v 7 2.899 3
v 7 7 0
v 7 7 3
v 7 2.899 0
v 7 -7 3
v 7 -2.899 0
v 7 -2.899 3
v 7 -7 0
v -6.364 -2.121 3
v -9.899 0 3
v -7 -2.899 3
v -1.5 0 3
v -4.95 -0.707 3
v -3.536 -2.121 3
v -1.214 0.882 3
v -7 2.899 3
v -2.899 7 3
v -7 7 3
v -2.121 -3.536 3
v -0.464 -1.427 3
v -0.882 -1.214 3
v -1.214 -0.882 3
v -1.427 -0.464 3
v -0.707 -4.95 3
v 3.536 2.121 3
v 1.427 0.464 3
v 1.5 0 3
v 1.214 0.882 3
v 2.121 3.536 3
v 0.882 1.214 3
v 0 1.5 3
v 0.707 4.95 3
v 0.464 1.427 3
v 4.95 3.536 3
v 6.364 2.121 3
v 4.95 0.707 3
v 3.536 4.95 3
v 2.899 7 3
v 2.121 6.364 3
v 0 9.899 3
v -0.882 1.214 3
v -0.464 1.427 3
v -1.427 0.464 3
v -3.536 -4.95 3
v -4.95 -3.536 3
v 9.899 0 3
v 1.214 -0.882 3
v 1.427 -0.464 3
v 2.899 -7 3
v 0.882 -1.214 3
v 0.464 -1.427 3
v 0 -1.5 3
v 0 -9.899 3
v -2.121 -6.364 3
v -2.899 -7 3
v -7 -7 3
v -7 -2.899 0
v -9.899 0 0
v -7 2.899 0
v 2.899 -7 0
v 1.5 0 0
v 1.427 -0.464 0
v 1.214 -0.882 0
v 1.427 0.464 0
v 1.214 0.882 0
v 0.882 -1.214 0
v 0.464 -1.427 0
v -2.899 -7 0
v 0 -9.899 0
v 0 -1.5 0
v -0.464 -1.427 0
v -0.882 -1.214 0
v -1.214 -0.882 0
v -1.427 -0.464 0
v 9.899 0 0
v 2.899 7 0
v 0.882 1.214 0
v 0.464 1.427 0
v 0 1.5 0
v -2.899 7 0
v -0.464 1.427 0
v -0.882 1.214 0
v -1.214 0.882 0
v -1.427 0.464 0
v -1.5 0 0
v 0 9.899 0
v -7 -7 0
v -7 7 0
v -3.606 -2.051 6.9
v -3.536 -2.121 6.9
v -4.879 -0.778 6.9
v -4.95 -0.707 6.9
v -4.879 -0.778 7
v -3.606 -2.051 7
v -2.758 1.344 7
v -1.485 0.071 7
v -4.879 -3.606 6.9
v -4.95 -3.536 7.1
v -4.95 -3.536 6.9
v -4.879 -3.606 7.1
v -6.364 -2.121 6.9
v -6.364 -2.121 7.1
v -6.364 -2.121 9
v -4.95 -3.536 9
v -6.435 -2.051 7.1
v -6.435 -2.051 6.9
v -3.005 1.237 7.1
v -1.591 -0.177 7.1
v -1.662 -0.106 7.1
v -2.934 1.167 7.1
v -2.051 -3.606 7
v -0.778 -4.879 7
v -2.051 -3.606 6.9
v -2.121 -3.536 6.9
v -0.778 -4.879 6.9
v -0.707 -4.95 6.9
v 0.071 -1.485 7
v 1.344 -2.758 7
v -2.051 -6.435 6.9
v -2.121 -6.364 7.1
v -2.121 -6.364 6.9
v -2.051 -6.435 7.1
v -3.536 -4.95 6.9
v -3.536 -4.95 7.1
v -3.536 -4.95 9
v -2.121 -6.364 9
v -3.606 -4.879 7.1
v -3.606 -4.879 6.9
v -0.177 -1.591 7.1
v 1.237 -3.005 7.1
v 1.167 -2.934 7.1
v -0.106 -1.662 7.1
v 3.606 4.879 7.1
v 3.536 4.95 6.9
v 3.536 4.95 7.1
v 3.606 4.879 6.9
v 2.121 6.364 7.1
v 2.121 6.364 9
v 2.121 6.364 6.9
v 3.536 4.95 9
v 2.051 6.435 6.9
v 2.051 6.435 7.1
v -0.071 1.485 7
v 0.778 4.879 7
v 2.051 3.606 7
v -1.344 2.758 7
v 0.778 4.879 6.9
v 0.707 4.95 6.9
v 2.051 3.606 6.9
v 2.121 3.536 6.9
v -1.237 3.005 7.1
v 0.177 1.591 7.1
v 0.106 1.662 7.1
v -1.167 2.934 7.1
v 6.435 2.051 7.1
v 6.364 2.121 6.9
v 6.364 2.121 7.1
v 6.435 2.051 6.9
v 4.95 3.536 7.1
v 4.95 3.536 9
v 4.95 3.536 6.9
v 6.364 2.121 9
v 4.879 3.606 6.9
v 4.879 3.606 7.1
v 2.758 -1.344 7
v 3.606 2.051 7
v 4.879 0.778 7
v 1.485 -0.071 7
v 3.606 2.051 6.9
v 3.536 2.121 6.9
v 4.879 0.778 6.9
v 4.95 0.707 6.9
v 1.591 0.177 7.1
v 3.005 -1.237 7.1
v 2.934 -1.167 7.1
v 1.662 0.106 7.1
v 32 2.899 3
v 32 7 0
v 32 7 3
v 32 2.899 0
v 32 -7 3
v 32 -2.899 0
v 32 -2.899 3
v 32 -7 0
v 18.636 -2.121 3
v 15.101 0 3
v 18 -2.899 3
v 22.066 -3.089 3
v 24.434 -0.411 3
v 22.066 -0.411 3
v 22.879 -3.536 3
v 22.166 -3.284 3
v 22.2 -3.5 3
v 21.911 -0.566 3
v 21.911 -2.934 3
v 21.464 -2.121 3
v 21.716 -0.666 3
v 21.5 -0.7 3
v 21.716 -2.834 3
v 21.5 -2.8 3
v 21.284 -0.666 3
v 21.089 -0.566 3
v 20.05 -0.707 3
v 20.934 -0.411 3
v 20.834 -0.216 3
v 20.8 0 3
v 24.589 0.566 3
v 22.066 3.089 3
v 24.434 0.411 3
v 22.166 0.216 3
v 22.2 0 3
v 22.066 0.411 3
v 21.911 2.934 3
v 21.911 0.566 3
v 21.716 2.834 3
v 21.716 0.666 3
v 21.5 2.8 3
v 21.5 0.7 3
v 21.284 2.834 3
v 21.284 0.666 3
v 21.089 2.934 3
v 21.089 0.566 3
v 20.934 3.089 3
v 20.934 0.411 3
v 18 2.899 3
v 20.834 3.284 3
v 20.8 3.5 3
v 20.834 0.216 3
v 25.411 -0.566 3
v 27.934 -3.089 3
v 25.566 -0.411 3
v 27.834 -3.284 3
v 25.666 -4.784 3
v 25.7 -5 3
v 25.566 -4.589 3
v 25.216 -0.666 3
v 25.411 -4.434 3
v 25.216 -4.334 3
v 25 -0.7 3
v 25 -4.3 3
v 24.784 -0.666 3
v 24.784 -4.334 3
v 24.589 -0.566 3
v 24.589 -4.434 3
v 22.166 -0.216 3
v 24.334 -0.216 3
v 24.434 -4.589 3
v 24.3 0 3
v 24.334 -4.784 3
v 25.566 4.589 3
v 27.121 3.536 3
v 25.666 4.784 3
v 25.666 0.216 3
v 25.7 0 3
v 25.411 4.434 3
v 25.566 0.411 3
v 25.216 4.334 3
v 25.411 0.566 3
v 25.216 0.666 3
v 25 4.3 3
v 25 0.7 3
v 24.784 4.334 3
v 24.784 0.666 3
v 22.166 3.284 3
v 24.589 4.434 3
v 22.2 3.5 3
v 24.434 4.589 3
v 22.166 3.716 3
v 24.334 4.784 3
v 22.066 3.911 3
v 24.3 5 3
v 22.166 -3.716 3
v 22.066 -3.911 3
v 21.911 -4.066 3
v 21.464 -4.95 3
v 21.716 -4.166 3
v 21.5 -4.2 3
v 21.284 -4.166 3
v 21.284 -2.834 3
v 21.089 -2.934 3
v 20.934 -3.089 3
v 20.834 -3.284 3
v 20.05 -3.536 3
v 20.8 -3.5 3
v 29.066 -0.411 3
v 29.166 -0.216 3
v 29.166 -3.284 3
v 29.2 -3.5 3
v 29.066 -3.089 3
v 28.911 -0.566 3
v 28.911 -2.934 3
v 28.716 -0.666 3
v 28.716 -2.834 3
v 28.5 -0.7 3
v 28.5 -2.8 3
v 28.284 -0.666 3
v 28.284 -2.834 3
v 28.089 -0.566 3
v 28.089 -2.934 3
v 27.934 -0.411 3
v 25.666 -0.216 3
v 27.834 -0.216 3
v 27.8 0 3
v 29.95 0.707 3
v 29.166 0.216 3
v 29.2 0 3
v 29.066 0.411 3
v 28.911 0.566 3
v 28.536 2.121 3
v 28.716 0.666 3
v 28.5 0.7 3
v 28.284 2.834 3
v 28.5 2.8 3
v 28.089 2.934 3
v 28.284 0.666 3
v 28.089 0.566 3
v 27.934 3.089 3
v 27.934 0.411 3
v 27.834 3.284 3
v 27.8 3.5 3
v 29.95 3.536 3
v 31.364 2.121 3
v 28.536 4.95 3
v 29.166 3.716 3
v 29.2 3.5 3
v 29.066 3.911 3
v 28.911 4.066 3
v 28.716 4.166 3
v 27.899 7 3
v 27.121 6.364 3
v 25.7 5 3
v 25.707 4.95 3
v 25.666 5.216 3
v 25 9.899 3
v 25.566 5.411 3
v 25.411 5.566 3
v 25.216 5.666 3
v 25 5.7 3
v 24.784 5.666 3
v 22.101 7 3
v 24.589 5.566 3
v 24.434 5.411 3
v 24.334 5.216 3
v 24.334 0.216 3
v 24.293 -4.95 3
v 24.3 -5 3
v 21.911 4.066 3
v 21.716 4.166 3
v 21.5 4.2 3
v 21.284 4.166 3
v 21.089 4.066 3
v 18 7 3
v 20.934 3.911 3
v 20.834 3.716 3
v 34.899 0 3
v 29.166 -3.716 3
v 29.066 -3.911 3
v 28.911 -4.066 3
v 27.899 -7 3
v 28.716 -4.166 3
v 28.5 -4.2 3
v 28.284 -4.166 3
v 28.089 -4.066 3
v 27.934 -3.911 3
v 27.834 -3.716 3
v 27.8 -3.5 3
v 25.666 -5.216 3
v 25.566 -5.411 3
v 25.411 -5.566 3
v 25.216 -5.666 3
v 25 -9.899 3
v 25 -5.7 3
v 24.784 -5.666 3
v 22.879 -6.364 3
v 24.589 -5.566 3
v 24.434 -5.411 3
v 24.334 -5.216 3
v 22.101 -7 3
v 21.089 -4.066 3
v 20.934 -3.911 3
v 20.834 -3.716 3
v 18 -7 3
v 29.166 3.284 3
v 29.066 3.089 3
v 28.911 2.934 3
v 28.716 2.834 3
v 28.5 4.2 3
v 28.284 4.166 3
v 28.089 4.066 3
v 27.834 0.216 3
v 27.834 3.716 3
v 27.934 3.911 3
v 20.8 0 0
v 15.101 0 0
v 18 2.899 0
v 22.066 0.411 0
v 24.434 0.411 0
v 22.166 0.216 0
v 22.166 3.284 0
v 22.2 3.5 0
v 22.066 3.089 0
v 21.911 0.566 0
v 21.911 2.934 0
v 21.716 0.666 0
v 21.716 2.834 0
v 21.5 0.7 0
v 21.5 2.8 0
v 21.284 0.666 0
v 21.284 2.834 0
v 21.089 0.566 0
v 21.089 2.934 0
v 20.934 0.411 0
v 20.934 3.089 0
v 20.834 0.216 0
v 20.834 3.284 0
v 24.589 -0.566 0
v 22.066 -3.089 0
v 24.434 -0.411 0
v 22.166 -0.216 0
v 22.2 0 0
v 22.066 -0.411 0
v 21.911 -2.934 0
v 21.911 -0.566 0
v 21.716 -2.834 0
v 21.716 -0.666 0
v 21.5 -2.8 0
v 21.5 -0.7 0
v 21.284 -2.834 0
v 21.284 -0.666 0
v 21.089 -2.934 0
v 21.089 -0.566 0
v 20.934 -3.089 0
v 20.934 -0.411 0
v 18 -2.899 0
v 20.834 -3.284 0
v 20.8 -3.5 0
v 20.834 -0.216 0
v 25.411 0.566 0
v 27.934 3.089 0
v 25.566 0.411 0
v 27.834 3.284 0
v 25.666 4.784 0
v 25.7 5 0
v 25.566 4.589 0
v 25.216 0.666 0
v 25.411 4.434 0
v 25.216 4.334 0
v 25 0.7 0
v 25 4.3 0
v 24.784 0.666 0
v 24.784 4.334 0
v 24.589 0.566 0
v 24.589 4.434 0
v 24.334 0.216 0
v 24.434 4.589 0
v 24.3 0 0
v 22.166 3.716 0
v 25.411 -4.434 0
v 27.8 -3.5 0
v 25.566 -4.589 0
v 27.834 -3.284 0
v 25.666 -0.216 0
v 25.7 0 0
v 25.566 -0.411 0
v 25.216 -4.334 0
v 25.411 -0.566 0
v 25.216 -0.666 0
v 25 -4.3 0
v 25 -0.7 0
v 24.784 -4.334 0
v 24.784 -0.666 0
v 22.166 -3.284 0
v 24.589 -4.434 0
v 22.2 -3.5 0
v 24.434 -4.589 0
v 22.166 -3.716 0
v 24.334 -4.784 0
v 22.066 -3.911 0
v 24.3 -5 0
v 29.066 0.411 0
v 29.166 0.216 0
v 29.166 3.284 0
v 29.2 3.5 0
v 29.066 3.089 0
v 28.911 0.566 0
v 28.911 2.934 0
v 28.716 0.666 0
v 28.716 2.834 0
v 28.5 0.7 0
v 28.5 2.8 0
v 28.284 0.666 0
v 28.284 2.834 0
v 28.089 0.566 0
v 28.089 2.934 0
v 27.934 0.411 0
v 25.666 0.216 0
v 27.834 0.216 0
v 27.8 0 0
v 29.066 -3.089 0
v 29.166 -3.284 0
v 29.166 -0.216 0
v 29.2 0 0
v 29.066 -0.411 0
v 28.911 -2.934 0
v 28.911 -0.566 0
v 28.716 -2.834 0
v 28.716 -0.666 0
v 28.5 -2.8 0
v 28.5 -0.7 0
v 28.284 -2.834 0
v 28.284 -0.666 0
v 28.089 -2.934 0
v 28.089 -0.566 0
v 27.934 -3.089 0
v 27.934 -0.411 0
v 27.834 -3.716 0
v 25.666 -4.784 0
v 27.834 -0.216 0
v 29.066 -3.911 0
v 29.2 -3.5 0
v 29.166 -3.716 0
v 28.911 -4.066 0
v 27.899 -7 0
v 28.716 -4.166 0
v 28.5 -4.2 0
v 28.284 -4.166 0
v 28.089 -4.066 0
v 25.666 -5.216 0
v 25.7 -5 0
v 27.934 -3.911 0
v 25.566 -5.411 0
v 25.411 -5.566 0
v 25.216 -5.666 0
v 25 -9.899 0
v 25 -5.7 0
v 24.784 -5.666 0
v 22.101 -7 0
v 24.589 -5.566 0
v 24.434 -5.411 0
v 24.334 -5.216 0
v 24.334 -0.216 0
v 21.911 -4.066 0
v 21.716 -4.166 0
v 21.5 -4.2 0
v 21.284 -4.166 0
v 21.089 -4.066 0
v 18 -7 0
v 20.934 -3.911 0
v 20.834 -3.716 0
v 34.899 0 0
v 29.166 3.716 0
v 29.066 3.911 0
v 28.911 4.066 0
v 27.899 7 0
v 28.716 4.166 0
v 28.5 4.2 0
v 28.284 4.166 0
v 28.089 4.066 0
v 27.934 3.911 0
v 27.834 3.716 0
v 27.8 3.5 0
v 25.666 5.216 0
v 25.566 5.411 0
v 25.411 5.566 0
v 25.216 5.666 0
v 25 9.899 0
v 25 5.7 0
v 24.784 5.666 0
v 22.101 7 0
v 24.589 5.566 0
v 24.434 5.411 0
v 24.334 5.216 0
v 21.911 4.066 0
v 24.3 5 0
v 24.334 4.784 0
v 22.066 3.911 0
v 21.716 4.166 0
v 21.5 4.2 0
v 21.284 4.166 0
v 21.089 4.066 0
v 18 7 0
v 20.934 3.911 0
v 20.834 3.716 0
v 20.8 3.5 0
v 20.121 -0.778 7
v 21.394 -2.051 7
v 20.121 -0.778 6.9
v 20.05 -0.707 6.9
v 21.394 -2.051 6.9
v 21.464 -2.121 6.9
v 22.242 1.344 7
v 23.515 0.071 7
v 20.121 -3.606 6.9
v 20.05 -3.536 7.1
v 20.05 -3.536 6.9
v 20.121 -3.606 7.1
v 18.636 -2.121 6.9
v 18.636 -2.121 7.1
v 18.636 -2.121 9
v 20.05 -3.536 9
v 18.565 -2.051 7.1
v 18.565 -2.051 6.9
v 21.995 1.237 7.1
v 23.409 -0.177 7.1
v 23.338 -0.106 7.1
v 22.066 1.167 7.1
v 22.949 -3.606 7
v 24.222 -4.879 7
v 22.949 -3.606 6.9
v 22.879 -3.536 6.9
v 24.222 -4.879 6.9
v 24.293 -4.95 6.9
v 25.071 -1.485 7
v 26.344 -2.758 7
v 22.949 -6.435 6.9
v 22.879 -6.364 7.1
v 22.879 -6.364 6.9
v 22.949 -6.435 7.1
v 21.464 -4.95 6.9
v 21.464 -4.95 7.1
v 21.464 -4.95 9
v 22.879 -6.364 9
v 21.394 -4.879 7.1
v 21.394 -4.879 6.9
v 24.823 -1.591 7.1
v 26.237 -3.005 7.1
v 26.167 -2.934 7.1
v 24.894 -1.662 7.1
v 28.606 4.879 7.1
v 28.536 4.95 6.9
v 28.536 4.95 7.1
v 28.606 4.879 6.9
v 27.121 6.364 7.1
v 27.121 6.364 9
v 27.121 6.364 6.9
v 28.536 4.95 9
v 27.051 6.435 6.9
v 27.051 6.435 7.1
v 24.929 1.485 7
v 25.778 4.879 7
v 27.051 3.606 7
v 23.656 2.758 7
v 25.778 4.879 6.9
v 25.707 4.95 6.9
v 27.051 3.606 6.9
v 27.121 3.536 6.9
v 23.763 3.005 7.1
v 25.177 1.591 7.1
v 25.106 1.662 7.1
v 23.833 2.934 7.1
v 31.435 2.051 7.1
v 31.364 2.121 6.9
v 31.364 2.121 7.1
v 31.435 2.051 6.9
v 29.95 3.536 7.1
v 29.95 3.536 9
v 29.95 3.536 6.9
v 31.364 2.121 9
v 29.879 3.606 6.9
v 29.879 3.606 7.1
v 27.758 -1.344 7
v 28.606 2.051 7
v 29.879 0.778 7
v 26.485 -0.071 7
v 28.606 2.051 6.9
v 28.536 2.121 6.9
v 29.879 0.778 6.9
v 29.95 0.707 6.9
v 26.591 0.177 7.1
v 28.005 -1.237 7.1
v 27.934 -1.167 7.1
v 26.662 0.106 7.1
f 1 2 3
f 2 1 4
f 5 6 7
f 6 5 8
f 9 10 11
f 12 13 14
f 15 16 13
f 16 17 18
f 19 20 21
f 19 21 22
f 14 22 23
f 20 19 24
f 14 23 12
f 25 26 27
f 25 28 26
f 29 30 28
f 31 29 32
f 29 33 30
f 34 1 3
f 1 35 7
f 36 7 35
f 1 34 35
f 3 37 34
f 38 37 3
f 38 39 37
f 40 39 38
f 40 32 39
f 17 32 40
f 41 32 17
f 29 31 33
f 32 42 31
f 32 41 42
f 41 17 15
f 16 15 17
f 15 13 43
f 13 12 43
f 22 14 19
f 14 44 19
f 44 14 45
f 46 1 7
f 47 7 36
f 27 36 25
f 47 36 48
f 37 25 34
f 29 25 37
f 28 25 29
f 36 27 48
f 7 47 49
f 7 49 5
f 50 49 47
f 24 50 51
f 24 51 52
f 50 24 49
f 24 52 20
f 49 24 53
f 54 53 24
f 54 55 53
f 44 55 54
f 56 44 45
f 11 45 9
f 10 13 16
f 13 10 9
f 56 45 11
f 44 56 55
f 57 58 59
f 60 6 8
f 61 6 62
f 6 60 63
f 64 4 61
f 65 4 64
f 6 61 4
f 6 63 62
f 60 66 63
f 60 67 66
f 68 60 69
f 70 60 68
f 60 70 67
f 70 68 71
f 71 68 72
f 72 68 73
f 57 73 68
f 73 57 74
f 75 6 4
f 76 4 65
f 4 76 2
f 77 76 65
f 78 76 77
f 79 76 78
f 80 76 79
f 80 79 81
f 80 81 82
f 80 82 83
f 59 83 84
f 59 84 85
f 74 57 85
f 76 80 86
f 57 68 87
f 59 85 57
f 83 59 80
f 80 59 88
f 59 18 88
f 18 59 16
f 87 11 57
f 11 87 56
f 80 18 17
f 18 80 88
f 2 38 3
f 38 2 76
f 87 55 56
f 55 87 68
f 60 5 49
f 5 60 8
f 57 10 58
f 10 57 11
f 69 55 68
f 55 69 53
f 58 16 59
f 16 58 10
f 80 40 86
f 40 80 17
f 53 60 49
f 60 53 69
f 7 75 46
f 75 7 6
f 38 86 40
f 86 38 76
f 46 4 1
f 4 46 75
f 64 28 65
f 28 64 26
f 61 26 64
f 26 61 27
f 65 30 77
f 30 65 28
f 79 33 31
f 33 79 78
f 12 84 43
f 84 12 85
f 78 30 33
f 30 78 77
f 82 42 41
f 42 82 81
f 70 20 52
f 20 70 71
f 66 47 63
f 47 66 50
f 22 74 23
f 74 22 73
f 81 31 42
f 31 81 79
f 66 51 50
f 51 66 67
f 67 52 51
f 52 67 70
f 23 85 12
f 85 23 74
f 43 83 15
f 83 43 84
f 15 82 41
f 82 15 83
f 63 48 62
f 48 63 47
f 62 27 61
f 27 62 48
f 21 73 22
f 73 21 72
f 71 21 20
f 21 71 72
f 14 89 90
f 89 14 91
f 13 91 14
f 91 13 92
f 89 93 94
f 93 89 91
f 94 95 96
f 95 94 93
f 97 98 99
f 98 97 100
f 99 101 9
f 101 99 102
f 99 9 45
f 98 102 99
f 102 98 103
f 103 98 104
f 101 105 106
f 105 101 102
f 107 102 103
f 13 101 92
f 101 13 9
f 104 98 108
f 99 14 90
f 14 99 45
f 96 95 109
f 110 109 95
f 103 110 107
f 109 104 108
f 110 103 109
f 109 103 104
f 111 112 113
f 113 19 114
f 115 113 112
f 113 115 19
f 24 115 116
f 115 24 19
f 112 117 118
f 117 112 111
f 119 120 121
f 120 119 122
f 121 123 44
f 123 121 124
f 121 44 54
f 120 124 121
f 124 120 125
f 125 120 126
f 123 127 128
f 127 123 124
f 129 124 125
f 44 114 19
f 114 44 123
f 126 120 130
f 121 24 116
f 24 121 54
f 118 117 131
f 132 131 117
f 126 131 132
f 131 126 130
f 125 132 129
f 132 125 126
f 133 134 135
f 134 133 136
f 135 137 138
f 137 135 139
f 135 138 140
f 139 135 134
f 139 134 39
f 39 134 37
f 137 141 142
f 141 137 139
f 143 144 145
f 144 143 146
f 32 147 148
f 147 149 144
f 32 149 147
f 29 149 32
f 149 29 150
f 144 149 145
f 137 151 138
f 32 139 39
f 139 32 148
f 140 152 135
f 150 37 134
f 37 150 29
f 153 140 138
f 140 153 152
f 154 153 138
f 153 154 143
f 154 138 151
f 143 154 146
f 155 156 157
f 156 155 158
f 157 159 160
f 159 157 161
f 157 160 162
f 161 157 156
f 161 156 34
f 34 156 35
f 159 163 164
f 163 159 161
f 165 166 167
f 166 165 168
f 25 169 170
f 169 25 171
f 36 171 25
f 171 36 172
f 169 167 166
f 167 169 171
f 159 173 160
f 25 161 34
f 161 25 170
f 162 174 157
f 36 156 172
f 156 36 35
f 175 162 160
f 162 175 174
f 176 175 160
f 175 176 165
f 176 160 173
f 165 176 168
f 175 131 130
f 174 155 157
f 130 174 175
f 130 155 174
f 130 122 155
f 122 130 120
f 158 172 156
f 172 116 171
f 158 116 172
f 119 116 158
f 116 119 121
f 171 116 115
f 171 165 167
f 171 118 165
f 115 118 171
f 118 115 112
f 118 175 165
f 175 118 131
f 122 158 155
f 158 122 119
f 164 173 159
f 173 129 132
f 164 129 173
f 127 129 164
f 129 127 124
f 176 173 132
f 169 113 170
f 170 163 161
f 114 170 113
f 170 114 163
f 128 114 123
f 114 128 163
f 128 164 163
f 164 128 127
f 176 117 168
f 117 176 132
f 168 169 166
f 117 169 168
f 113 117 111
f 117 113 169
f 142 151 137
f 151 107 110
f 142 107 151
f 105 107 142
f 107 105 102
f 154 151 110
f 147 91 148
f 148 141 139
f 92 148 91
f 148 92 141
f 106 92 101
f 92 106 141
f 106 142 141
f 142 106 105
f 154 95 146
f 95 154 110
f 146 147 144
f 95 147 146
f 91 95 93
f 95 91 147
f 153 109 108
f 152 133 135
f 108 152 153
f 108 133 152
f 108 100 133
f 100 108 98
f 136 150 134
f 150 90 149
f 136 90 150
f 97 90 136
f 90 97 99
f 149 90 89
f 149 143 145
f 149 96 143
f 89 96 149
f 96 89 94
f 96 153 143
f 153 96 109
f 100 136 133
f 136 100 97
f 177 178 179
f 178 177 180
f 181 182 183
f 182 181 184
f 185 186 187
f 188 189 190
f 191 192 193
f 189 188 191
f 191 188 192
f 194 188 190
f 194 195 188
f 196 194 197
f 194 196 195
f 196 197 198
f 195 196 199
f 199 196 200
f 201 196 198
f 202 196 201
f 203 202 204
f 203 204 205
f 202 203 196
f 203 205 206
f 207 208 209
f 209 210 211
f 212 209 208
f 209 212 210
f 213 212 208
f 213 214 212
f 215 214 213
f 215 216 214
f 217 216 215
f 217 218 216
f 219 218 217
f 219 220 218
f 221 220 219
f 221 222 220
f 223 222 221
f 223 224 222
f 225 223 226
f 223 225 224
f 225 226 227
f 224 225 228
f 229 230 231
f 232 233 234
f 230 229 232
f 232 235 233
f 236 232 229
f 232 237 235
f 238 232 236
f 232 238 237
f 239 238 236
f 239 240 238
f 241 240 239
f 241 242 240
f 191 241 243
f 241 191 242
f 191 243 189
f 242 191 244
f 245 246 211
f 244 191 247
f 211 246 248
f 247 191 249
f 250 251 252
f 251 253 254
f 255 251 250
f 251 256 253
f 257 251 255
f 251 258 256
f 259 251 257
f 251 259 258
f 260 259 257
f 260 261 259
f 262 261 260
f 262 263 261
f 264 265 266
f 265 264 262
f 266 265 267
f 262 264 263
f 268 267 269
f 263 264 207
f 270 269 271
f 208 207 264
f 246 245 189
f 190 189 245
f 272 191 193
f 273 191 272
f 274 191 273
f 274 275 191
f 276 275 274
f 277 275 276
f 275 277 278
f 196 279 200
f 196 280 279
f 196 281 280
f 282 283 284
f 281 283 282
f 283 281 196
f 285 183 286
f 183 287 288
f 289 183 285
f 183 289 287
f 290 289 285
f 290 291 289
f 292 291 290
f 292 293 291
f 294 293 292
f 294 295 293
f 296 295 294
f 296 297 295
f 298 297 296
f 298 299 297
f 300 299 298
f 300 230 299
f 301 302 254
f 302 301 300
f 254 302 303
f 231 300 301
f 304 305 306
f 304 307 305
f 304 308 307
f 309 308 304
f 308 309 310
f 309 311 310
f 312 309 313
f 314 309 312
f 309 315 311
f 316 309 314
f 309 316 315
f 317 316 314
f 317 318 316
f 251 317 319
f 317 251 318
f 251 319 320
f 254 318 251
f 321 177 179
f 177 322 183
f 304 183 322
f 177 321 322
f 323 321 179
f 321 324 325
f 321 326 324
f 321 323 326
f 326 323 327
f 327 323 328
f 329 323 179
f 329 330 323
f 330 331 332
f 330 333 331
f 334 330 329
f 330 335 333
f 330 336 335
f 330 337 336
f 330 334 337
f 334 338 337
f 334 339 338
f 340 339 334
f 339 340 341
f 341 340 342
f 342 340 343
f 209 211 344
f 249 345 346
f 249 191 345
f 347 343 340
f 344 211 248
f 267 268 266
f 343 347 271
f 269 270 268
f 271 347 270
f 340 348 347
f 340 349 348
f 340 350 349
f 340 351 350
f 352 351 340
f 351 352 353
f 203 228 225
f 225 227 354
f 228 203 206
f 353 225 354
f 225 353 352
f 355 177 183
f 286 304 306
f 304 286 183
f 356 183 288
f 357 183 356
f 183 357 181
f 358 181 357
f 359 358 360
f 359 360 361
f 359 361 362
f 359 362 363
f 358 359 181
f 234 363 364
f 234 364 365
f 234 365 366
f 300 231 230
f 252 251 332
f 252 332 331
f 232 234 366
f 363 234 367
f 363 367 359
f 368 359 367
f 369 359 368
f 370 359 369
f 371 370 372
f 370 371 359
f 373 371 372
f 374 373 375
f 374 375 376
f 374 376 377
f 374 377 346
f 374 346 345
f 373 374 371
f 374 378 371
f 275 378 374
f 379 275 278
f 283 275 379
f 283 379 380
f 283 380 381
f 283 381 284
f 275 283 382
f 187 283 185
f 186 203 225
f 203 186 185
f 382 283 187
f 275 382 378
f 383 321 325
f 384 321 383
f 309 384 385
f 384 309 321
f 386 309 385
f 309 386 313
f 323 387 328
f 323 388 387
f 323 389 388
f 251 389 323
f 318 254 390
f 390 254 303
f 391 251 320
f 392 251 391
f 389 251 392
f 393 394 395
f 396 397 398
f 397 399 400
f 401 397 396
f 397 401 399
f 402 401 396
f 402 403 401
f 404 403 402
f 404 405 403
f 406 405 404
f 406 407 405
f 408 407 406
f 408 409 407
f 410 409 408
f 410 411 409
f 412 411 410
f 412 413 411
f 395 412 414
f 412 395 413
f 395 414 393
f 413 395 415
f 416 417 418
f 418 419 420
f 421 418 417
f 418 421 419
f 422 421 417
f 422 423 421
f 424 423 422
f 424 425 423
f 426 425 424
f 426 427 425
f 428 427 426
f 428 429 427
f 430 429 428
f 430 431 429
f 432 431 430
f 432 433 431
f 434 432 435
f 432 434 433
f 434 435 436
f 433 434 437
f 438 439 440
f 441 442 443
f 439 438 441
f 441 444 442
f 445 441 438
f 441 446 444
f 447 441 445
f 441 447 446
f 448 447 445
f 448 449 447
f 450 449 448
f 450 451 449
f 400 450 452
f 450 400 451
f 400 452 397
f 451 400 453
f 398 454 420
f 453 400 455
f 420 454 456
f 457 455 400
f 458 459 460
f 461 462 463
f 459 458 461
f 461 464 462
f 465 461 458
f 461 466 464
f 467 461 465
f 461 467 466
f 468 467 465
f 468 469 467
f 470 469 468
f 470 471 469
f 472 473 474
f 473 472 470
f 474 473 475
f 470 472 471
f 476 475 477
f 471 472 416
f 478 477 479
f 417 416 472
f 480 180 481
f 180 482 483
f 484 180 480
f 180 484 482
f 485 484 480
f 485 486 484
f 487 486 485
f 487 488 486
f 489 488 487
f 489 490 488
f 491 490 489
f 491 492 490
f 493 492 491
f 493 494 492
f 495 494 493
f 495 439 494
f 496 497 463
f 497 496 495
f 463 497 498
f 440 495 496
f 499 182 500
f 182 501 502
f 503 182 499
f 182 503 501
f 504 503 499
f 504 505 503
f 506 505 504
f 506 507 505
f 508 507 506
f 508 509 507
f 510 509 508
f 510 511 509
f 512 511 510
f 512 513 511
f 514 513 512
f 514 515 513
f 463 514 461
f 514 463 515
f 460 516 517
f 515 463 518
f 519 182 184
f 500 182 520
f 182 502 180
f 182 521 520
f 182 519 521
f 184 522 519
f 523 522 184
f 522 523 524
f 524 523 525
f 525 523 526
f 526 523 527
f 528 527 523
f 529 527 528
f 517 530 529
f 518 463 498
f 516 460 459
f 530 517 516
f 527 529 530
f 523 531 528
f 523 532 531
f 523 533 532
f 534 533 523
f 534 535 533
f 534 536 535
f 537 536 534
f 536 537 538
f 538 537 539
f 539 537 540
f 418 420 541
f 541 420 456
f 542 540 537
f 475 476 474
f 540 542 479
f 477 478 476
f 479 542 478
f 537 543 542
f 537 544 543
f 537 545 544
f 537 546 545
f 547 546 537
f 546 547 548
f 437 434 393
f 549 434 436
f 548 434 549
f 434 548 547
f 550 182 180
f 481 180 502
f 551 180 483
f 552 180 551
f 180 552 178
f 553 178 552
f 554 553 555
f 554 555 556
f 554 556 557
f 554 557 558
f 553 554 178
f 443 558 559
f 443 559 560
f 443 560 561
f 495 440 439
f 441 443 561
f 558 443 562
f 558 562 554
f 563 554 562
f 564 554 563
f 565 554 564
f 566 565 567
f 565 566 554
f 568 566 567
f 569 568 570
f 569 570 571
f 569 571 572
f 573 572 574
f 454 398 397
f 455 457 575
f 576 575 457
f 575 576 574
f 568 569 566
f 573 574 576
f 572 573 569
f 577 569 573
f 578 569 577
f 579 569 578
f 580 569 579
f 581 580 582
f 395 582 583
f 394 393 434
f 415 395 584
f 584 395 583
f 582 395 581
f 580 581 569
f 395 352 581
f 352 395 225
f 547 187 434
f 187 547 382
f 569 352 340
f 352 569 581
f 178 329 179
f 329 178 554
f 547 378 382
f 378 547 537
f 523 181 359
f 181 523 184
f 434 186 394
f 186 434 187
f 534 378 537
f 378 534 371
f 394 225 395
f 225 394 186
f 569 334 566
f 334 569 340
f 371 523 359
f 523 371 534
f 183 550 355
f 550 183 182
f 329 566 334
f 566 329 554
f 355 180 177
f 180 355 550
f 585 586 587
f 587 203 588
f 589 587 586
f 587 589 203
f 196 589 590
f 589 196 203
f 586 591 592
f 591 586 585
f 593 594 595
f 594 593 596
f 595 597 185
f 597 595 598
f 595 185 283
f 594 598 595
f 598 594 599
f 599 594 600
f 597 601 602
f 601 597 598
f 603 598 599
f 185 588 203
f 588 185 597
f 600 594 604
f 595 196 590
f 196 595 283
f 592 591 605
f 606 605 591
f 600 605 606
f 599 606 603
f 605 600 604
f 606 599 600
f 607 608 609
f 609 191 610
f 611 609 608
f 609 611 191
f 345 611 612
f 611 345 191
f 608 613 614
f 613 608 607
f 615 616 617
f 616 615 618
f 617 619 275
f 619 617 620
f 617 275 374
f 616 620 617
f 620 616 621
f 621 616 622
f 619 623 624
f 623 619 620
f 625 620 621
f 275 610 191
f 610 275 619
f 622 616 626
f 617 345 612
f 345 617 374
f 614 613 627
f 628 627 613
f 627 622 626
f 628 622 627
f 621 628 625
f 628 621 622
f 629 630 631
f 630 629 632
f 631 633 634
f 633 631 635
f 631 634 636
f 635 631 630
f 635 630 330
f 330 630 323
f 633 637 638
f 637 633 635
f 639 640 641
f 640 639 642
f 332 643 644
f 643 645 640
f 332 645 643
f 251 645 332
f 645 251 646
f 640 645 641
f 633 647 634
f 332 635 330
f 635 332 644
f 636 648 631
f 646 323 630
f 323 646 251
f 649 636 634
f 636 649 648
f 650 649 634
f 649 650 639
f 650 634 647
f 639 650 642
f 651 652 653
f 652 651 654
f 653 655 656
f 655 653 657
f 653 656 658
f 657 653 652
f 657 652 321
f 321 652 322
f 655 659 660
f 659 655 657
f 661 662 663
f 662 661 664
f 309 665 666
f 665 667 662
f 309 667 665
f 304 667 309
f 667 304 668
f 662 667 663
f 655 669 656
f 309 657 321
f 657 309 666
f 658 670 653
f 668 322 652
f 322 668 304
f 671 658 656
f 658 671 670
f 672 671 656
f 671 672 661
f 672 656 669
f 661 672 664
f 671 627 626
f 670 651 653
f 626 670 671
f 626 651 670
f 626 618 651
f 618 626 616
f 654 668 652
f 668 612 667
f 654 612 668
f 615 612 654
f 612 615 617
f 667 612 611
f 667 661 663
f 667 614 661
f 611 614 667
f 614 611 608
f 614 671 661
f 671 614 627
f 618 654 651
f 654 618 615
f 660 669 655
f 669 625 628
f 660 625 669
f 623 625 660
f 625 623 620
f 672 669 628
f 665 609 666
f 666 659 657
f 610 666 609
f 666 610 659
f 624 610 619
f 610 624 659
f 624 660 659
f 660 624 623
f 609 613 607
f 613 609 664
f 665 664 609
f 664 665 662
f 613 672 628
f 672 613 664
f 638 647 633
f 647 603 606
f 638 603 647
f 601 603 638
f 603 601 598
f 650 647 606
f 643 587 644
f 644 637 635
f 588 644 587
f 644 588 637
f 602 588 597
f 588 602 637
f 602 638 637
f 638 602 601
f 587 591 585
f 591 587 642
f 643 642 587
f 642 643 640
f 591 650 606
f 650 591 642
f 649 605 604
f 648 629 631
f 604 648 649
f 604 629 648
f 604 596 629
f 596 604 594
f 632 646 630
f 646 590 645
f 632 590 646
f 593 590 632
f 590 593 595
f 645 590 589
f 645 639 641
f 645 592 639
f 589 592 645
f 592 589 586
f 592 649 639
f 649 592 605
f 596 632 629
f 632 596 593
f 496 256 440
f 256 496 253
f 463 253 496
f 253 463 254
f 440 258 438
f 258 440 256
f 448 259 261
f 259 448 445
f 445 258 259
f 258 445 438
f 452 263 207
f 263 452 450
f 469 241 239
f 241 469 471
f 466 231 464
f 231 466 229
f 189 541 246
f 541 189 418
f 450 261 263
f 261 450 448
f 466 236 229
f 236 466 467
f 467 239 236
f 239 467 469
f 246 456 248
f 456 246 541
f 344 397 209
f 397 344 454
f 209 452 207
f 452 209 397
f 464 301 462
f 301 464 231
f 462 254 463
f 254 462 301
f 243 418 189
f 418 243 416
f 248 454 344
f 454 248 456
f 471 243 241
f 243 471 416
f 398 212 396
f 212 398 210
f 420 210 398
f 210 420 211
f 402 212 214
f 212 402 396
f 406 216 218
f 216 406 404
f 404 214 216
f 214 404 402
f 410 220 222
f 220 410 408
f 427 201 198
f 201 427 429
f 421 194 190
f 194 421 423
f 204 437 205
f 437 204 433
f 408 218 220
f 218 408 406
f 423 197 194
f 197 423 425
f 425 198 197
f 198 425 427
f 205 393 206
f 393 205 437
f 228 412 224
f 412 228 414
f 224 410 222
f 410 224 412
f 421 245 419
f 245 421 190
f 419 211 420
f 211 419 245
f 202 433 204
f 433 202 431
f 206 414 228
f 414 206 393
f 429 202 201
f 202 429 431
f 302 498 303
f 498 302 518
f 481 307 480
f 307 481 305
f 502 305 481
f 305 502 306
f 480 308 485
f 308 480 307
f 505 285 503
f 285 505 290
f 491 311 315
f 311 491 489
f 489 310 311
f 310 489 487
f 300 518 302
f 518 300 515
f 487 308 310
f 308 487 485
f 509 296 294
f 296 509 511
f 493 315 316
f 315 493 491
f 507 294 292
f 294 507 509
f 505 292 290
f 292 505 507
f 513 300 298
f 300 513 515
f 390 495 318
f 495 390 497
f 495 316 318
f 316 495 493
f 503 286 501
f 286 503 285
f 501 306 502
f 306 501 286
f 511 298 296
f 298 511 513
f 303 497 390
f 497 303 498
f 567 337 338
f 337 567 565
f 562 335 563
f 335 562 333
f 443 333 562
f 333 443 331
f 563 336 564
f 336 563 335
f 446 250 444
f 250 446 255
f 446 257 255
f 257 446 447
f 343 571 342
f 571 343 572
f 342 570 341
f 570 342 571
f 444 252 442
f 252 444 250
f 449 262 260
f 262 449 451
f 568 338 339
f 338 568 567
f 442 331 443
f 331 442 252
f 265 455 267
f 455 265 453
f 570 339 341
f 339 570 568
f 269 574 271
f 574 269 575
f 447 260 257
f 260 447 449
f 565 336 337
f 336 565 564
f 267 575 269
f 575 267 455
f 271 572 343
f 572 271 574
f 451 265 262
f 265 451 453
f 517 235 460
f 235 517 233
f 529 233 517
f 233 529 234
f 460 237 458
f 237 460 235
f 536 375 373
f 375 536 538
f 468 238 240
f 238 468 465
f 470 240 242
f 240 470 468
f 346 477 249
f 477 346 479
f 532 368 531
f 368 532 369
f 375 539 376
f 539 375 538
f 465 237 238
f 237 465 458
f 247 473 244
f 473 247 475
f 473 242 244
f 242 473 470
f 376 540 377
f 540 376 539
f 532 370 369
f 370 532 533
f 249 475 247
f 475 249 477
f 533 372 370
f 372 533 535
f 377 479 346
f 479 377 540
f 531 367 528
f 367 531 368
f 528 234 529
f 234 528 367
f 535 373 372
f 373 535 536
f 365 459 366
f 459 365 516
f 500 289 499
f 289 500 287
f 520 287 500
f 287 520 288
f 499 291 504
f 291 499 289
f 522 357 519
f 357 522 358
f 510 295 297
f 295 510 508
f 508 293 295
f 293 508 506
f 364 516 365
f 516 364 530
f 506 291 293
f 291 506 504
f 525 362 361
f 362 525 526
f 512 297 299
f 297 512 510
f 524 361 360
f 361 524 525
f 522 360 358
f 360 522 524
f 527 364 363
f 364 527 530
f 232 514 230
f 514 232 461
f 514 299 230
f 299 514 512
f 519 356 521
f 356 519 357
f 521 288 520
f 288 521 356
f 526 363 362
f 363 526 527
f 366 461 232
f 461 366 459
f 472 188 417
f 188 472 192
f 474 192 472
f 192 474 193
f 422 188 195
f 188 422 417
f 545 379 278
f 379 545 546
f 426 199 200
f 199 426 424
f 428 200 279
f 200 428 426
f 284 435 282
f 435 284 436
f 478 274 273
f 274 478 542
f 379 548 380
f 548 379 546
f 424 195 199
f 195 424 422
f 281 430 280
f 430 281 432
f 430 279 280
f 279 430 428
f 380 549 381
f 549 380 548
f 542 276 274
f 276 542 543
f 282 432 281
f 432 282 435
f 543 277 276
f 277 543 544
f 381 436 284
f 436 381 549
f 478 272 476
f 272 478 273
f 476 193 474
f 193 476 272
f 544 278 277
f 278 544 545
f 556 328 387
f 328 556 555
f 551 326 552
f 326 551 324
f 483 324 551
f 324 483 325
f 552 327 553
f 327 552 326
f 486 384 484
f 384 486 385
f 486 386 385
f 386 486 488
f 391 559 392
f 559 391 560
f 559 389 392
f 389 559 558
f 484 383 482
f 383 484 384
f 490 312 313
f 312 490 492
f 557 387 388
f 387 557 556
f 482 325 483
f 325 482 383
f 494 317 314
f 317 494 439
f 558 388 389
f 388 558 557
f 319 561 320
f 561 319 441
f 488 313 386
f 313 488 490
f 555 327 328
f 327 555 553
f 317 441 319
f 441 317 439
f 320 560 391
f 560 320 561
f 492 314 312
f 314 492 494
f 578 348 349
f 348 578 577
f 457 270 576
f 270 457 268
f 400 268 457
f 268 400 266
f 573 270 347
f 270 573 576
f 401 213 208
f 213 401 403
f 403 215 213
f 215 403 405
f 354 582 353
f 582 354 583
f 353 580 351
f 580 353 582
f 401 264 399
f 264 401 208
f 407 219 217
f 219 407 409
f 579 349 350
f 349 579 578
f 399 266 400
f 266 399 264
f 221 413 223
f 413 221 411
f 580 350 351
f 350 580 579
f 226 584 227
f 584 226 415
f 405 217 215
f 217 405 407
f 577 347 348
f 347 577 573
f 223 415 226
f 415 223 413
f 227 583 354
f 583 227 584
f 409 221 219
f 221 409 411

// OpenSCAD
//Salt hole radius in mm [default 1.5]
salt_r=1.5;//[0.5:0.1:3]
//Pepper holes radius in mm default [0.7]
pepper_r=0.7;//[0.2:0.1:1.2]
//Width and depth of tip base in mm [def 14]
x=14;//[13.5:0.1:14.5]
//Height of tip base in mm [def 3]
z=3;//[1:0.1:7]
//Height of clasps in mm [def 4]
h=4;//[0:0.1:8]




//salt
difference() { 
    union() {
        translate([0,0,z/2])
        cube([x,x,z], center = true);
         translate([0,0,z/2])
        rotate(45) cube([x,x,z], center = true);
            };
          translate([0,0,z/2])  
    cylinder(h=2*z,r=salt_r, center = true, $fn=20);
        }
        
// clasps
     clasps();   
        


//pepper        
translate([25,0,0]) {
        difference() { 
    union() {
        translate([0,0,z/2])
        cube([x,x,z], center = true);
        translate([0,0,z/2])
        rotate(45) cube([x,x,z], center = true);
            };
    union(){
        translate([0,0,z/2]){
          cylinder(h=2*z,r=pepper_r, center = true, $fn=20);  
           translate([-3.5,0,0]) {     
    cylinder(h=2*z,r=pepper_r, center = true, $fn=20);
           }
        translate([3.5,0,0]) {
    cylinder(h=2*z,r=pepper_r, center = true, $fn=20);
        }
                 translate([0,5,0]) {     
    cylinder(h=2*z,r=pepper_r, center = true, $fn=20);
           }
        translate([0,-5,0]) {
    cylinder(h=2*z,r=pepper_r, center = true, $fn=20);
        } 
        translate([3.5,-3.5,0]) {
    cylinder(h=2*z,r=pepper_r, center = true, $fn=20);
        }
          translate([-3.5,-3.5,0]) {
    cylinder(h=2*z,r=pepper_r, center = true, $fn=20);
        }  
           translate([3.5,3.5,0]) {
    cylinder(h=2*z,r=pepper_r, center = true, $fn=20);
        } 
            translate([-3.5,3.5,0]) {
    cylinder(h=2*z,r=pepper_r, center = true, $fn=20);
        }  
    }     
    }
        }
        // clasps
clasps();
    }
    
    module clasps(){
                rotate(45) {

translate([-5,2,(h/2)+z]) {     
cube([2,2,h], center = true);  
   translate([4,1,h/2]) {
    rotate(180){
   prism(2, 5, 2);  }
} 
} 


translate([-5,-2,(h/2)+z]) {     
cube([2,2,h], center = true);  
   translate([4,1,h/2]) {
    rotate(180){
   prism(2, 5, 2);  }
} 


}

 
translate([5,2,(h/2)+z]) {     
cube([2,2,h], center = true);  
   translate([-4,-1,h/2]) {
   prism(2, 5, 2);  }
} 

translate([5,-2,(h/2)+z]) {     
cube([2,2,h], center = true);  
   translate([-4,-1,h/2]) {
   prism(2, 5, 2);  }
} 

translate([0,-3,h+z]) {     
cube([12,0.2,0.2], center = true);   
} 
translate([0,-1,h+z]) {     
cube([12,0.2,0.2], center = true); 
} 
   translate([0,3,h+z]) {     
cube([12,0.2,0.2], center = true);   
} 
translate([0,1,h+z]) {     
cube([12,0.2,0.2], center = true); 
}


// bridges 

}
}



    
       module prism(l, w, h){
       polyhedron(
               points=[[0,0,0], [0,l,0], [w,l,0], [w,0,0], [w,0,h], [w,l,h]],
               faces=[[0,1,2,3],[5,4,3,2],[0,4,5,1],[0,3,4],[5,2,1]]
               );
       }
   
